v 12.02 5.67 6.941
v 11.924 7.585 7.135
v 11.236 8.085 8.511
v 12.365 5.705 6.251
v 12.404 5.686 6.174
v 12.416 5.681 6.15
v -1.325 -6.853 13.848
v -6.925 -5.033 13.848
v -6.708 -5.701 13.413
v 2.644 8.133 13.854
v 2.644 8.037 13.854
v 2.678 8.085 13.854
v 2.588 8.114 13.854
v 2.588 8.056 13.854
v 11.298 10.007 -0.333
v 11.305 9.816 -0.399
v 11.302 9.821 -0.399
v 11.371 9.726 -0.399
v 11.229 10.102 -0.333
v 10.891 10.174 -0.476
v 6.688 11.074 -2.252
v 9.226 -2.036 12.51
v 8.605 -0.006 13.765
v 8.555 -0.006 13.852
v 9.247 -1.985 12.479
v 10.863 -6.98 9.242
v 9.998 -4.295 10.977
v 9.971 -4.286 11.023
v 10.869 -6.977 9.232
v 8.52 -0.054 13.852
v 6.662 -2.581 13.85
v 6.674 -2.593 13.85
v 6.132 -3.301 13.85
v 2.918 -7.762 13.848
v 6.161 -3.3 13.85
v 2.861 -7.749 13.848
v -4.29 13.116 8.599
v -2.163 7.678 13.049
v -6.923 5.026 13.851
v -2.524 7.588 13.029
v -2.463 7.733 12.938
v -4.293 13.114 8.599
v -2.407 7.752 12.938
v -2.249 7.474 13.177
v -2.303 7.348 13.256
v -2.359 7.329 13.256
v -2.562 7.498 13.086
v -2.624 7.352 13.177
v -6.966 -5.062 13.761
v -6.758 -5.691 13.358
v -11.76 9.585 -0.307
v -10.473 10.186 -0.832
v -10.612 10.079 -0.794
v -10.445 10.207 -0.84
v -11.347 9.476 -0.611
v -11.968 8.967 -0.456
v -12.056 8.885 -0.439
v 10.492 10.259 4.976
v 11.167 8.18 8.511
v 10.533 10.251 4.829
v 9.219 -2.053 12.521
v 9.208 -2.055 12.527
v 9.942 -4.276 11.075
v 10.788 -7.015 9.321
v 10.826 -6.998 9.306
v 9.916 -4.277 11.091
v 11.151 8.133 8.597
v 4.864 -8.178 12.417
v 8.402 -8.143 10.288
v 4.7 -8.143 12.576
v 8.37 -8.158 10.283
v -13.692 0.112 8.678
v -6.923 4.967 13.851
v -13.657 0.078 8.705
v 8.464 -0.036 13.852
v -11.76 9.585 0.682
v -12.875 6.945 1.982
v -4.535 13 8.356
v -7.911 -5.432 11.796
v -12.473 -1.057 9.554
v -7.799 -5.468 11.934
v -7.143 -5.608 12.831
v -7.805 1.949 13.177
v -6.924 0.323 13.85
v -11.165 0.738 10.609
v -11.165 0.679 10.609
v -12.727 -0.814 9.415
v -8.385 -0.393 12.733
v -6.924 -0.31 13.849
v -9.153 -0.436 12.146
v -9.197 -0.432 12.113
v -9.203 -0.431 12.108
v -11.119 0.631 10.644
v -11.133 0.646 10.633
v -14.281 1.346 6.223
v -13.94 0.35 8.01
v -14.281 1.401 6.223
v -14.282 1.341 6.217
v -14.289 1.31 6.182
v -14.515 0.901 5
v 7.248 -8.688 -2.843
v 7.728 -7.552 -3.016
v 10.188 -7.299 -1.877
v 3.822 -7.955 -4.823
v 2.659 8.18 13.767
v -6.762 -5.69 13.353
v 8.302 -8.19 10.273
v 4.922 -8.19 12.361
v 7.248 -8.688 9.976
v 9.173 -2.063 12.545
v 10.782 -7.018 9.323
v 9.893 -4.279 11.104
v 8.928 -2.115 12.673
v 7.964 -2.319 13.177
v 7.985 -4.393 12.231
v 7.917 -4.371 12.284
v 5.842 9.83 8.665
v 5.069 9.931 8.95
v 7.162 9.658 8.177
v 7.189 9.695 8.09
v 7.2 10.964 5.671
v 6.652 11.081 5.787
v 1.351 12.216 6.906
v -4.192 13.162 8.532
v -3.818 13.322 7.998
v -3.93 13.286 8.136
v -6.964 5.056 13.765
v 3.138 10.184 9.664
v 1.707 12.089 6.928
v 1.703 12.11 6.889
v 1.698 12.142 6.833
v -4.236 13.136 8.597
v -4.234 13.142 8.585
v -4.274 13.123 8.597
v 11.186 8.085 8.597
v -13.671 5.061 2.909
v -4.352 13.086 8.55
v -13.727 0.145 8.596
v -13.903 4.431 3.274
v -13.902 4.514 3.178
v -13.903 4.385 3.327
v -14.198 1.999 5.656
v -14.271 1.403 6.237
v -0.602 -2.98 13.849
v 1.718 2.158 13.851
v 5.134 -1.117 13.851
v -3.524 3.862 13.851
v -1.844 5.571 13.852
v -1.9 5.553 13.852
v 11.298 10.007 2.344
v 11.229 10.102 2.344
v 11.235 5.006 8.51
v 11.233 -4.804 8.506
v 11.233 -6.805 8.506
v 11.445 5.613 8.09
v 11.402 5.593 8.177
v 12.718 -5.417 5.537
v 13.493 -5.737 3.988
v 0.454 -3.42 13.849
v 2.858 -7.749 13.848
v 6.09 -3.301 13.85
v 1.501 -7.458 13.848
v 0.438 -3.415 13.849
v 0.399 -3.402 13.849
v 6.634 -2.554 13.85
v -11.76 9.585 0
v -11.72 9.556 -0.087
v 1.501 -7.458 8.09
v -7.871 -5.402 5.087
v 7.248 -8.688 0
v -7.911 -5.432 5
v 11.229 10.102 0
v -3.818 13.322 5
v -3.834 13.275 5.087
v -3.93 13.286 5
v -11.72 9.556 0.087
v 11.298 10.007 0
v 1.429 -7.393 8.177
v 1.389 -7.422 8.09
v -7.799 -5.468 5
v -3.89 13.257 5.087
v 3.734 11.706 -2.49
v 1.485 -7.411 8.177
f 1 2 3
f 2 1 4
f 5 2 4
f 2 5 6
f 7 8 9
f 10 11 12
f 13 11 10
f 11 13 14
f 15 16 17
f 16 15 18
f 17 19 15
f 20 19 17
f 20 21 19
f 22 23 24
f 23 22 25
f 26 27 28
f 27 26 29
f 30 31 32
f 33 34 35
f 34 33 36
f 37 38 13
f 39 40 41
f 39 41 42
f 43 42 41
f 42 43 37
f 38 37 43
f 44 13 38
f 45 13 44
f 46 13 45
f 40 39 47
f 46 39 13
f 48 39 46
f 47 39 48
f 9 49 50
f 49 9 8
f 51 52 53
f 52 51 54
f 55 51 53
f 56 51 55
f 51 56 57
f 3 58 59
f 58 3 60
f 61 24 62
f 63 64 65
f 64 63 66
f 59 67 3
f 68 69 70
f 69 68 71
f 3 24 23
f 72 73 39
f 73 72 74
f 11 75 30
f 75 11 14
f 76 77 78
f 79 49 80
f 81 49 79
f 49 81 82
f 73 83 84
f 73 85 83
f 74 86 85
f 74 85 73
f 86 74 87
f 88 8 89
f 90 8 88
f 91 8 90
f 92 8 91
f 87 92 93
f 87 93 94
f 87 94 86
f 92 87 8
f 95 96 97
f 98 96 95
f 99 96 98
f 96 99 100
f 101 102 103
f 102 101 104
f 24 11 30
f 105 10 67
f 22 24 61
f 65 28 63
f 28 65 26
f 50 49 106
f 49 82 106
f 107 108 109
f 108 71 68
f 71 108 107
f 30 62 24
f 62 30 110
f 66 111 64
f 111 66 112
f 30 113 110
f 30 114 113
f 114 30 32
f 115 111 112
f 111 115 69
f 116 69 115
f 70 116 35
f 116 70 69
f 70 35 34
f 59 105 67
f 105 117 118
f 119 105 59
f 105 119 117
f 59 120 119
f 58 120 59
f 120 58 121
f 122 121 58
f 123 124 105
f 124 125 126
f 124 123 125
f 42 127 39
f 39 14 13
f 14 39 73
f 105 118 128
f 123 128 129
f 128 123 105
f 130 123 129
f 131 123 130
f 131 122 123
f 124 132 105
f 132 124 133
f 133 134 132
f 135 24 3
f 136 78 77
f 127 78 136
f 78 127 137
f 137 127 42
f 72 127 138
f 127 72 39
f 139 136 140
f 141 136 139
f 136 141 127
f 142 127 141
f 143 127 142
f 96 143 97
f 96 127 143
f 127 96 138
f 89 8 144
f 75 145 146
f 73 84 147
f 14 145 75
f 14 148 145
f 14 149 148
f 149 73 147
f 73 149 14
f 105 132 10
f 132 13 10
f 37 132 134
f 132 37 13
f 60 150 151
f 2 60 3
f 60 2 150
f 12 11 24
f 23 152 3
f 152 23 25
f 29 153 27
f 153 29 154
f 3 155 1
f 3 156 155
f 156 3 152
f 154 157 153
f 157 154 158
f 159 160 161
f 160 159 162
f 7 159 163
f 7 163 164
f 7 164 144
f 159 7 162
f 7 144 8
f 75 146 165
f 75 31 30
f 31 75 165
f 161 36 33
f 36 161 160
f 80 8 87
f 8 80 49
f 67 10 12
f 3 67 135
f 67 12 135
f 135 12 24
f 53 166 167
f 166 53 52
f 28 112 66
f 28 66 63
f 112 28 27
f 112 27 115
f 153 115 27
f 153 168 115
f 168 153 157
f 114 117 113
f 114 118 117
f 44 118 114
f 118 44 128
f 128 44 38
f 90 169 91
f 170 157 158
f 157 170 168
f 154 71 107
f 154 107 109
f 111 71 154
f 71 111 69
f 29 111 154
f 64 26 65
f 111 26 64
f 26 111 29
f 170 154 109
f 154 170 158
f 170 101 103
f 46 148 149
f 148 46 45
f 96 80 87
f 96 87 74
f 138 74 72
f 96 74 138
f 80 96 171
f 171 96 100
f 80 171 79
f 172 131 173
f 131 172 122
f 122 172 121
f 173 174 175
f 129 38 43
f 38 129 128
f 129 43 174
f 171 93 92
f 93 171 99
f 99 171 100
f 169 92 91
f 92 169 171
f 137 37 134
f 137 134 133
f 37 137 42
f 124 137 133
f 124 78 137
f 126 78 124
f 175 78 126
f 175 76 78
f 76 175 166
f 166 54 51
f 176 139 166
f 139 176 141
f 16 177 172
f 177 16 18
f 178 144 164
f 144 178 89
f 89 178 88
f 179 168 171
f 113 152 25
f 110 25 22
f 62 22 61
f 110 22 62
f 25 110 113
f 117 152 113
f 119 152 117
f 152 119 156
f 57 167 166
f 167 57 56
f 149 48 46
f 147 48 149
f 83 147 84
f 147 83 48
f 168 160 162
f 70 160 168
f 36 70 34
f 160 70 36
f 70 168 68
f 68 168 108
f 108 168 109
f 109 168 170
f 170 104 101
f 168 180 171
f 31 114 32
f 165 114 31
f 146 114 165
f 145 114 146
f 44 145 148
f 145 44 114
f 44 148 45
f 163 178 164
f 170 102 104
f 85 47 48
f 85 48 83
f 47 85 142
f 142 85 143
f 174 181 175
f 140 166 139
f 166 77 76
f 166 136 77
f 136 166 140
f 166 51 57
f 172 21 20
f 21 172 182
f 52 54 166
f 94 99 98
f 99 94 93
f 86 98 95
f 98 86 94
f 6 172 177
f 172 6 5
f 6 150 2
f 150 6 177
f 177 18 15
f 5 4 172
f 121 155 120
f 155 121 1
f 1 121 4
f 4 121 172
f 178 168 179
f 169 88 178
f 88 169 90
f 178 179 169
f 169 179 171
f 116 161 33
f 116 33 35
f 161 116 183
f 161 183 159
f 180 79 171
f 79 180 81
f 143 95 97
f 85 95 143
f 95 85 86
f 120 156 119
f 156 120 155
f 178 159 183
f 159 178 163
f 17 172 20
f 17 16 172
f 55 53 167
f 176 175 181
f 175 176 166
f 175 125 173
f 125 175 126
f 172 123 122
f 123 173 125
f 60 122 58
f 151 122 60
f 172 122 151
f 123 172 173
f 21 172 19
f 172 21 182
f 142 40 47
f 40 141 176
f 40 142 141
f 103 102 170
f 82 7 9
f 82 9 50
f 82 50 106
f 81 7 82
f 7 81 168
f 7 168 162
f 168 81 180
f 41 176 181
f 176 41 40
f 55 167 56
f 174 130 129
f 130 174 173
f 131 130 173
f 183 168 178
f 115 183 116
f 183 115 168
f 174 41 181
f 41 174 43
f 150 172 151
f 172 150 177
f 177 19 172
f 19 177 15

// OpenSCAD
// Auto-generated OpenSCAD file

    inner_points = 10*[[0.9299608274506113, -0.36625251042878015, 1.3090169944285586], [-0.9300308766981566, 0.03182392530465242, -1.3090169944285586], [1.266848278790813, 0.4315612808941218, -0.8090169942043599], [-0.38493553047389745, 1.3227137557713289, 0.5000000001356605], [-3.5024755881594054e-05, -0.16721429274351698, 1.618033988749895], [-1.5047999228086544, 0.15483630882503643, -0.5000000000867447], [1.5047298735611092, -0.48926489394916417, 0.5000000000867447], [-3.502449166371223e-05, -0.16721429238061072, -1.618033988749895], [1.2668482786587043, 0.43156128071266875, 0.809016994545535], [-0.2379166193940685, 0.753611882281222, -1.3090169942911047], [-0.9300308769119134, 0.03182392501105499, 1.3090169943213361], [-1.504799922890302, 0.15483630871289225, 0.4999999999132554], [1.5047298736427568, -0.48926489383702, -0.4999999999132554], [0.929960827664368, -0.3662525101351827, -1.3090169943213361], [1.1198293677926323, 1.0006631544963729, 2.224050943411271e-10], [0.5450603218142434, 1.12367553819821, -0.8090169941856757], [-0.23791661960782534, 0.7536118819876247, 1.3090169944587902], [-1.1679124716822094, 0.952650099854341, 3.023159500514794e-11], [0.5450603216821343, 1.123675538016757, 0.8090169945642192], [-0.38493553039224954, 1.3227137558834732, -0.4999999998643395], [-0.7830119659137325, -0.5372779485911959, 0.4999999998945711], [0.1469838862422994, -0.7363161663457679, 0.8090169943231298], [-0.7830119658320847, -0.5372779484790517, -0.500000000105429], [0.7217529323527971, -0.859328549866152, -1.86841930815973e-11], [0.14698388637440846, -0.7363161661643148, -0.8090169944267651]];

    outer_points = 10*[[0.0003389073222320645, 1.6180338602780315, 0.0005485303033235351], [-0.0003389073222320645, -1.6180338602780315, -0.0005485303033235351], [-1.376497554636943, 0.0, 0.8504636798996249], [0.8504636123728273, -0.0006447818753087883, 1.376497445343067], [0.9513306684223868, 1.3088176418818913, 0.0005730337122140106], [0.950782304855979, -1.309216138996162, -0.0003145069624228003], [-0.950782304855979, 1.309216138996162, 0.0003145069624228003], [-0.9513306684223868, -1.3088176418818913, -0.0005730337122140106], [-0.4251668862145562, 1.3088176418818913, 0.8510367136118389], [-0.42571524978096387, -1.309216138996162, 0.8501491729372022], [1.538946448725346, 0.4996775693623565, 0.00037865771973821793], [1.5387369924811702, -0.5003223512376653, 3.964734842487605e-05], [-1.5387369924811702, 0.5003223512376653, -3.964734842487605e-05], [-1.538946448725346, -0.4996775693623565, -0.00037865771973821793], [-0.688273380108343, 0.4996775693623565, 1.3764577979946422], [-0.6884828363525187, -0.5003223512376653, 1.3761187876233287], [1.1135701062666141, 0.808495290644226, 0.8510763609602638], [1.1132311989443822, -0.8095385696338055, 0.8505278306569404], [0.2628478320698681, 0.808495290644226, 1.3766918213355428], [0.26250892474763604, -0.8095385696338055, 1.3761432910322193], [0.8507222741967461, 0.0, -0.525615460375279], [0.2631064938937868, 0.8091400725195348, -0.5254210843828031], [0.26276758657155475, -0.8088937877584967, -0.5259696146861268], [-0.6880147182844242, 0.5003223512376653, -0.5256551077237038], [-0.6882241745285999, -0.4996775693623565, -0.5259941180950172]];

    // Convex hull for inner set (I)
    module inner_hull() {
        hull() {
            for (p = inner_points) {
                translate(p) sphere(r=0.1);
            }
        }
    }

    // Convex hull for outer set (O) minus inner hull (O \ I)
    module outer_minus_inner() {
        difference() {
            hull() {
                for (p = outer_points) {
                    translate(p) sphere(r=0.1);
                }
            }
            inner_hull(); // Subtract inner hull
        }
    }

    // Convex hull for outer set (O) minus all translated inner hulls
    module outer_minus_AllTranslationInner() {
        difference() {
            hull() {
                for (p = outer_points) {
                    translate(p) sphere(r=0.1);
                }
            }
            hull() {
                translate([0,0,50]) inner_hull();
                translate([0,0,-50]) inner_hull();
            }; // Subtract translated inner hulls
        }
    }

    // Difference between outer_minus_inner and outer_minus_AllTranslationInner
    module outer_minus_inner_diff() {
        difference() {
            // Outer minus inner
            difference() {
                hull() {
                    for (p = outer_points) {
                        translate(p) sphere(r=0.1);
                    }
                }
                inner_hull();
            }

            // Subtract Outer minus AllTranslationInner
            difference() {
                hull() {
                    for (p = outer_points) {
                        translate(p) sphere(r=0.1);
                    }
                }
                hull() {
                    translate([0,0,50]) inner_hull();
                    translate([0,0,-50]) inner_hull();
                };
            }
        }
    }

    // Rendering all with colors applied
    color([1, 1, 0, 1]) outer_minus_inner_diff(); // Opaque yellow
    
